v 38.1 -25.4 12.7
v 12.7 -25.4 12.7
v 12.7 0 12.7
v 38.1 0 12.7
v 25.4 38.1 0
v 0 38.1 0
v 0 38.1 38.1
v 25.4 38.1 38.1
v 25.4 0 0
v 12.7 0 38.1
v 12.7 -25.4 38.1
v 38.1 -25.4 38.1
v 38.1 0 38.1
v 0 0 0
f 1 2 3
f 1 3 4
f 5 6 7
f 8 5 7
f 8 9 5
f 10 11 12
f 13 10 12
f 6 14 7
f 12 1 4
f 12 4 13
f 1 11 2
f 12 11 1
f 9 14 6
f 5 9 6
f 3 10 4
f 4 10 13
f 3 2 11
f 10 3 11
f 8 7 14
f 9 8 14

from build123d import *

# Parameters (mm, degrees)
F2_DEPTH = 25.4
F0_W     = 25.4
F0_H     = 25.4
F3_DEPTH = 25.4


with BuildPart() as f2:
    # F1 (on Right) → F2 (new body)
    with BuildSketch(Plane.YZ):
        Polygon((38.1, 38.1), (0, 0), (38.1, 0), align=None)
    extrude(amount=F2_DEPTH)


with BuildPart() as f3:
    # F0 (on Front) → F3 (new body)
    with BuildSketch(Plane.XZ):
        with Locations((25.4, 25.4)):
            Rectangle(F0_W, F0_H)
    extrude(amount=F3_DEPTH)


solid = Compound([f2.part, f3.part])
